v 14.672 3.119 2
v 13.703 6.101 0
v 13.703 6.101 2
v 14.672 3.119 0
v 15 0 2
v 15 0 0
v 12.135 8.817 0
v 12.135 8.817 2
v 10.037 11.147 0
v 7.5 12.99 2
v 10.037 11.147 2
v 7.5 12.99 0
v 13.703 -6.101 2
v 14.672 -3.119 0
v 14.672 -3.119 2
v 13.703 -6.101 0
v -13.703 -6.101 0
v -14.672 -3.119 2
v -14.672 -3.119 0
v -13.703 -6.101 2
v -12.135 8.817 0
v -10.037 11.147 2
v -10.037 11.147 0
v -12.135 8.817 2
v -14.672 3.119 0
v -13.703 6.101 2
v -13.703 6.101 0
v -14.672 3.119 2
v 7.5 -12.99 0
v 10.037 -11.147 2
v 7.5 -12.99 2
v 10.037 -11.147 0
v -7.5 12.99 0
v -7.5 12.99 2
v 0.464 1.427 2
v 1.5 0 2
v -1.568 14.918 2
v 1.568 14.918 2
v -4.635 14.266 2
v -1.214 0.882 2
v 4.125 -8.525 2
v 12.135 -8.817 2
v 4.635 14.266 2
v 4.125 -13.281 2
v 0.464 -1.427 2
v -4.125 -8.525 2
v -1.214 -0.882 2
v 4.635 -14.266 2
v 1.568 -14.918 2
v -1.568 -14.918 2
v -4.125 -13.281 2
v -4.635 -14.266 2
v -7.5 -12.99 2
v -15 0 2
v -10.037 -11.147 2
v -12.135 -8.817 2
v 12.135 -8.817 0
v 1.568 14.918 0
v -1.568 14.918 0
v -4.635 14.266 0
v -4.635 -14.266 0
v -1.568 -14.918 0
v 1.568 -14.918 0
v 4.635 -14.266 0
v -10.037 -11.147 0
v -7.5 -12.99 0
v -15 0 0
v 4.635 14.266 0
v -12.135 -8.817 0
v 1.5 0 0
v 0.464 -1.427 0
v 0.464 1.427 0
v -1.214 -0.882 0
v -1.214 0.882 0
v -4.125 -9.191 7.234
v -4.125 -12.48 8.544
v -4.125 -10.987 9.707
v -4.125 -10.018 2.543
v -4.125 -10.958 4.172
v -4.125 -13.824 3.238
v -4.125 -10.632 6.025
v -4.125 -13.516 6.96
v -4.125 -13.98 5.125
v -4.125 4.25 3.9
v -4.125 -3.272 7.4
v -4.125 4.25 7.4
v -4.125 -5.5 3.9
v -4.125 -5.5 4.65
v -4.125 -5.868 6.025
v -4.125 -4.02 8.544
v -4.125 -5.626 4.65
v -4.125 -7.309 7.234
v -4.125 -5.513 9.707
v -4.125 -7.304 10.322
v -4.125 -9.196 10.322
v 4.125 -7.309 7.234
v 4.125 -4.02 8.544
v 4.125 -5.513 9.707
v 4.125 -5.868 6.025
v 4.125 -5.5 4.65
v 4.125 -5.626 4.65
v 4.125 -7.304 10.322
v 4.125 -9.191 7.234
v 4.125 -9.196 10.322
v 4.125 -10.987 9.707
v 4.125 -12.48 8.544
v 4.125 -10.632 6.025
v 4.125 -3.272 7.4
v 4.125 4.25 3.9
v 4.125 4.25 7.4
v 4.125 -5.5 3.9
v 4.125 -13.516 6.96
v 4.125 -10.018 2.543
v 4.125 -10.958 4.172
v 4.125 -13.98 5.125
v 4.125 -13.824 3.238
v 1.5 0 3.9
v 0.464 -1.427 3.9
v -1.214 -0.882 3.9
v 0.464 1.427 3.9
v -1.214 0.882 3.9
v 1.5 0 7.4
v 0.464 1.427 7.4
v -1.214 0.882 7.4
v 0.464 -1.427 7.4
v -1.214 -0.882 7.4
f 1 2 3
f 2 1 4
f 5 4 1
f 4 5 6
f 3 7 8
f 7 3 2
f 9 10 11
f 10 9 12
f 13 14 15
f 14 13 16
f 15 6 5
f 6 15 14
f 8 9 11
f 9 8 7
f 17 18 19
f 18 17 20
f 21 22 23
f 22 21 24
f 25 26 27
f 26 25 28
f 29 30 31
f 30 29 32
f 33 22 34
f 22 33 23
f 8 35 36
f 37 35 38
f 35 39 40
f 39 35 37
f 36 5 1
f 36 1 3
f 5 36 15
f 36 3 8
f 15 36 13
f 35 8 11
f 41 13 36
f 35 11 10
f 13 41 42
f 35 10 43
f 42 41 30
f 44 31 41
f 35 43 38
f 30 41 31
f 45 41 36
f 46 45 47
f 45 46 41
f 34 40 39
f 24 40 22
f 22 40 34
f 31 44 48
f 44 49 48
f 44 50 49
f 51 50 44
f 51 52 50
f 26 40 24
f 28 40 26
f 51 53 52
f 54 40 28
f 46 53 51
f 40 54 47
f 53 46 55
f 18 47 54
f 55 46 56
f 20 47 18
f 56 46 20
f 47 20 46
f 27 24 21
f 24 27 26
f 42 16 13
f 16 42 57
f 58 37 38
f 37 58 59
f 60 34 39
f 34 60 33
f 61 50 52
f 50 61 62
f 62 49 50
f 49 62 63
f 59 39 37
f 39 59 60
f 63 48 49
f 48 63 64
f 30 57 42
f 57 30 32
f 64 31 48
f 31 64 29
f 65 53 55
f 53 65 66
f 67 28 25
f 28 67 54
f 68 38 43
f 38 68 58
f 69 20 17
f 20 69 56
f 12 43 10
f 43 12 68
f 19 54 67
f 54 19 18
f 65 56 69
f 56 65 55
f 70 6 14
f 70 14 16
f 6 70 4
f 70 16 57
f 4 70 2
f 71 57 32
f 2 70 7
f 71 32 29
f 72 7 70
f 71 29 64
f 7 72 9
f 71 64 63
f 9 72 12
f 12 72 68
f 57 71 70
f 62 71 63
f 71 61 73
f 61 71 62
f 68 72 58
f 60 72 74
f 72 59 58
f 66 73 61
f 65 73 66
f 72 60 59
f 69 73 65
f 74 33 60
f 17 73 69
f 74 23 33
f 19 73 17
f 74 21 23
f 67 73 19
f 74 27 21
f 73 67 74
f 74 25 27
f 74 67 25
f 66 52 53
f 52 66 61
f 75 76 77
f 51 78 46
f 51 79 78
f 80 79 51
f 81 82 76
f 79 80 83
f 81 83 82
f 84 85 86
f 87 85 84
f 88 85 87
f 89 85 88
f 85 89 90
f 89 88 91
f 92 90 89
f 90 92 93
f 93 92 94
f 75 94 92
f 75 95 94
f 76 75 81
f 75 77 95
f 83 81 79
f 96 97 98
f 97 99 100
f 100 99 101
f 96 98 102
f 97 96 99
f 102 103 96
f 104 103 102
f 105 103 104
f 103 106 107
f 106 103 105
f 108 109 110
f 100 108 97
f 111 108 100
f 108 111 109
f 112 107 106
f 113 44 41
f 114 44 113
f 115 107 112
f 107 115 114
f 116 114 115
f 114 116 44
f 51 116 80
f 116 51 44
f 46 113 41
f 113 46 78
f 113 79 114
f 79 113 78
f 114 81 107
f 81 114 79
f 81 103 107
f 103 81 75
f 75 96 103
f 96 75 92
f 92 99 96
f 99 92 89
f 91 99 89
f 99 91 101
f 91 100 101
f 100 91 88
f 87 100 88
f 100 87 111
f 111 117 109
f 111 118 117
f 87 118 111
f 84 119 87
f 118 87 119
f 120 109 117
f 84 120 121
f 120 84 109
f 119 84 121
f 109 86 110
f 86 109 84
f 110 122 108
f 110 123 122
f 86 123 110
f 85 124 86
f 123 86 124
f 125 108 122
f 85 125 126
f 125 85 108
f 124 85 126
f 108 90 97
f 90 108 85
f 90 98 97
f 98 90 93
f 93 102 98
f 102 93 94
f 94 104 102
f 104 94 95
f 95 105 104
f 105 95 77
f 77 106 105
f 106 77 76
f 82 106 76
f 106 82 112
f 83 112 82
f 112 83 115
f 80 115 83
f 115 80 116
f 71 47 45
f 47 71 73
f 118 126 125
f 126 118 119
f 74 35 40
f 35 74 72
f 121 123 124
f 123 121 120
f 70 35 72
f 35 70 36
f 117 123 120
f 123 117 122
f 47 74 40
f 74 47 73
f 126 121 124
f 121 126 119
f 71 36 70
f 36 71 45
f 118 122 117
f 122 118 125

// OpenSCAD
/*
    Join two rods, so that they can be turned to any angle, and held in place.
    
    Print Notes :
        Print with support (not only touching the build plate).
        
    Assembly :
        Print two copies, and sandwich them with a rubber washer.
        
        Cut away the support material (I knicked myself twice - be more careful than me!)
        Drill the holes out, so that the screw moves freely on one piece and bites in on the other.
        I used M3 bolts, so drilled one 2.5mm (and then tapped it), and then other 3.5mm (loose).
        If using bolts, rather than screws, then tap the hole.
        You can usually use the bolt itself to tap the hole, as the plastic is soft.
*/

rodD=5.5;

baseD=30;
thickness=2;
heft=3;
gap=2;
overlap=7;
screwD=3;

module clampShape()
{
    difference() {
        union() {
            circle( d=rodD + heft*2 );
            translate( [-rodD/2,rodD/2] ) square( [rodD,rodD/2+overlap] );
        }

        // Hole for the rod
        circle( d=rodD );
        // Flatten to ensure it doesn't stick through the base
        translate( [rodD/2+thickness/2,-rodD] ) square( [100,100] );
        // Cut away a corner, so the rod is free when the screw isn't tightened
        square( [rodD/2+heft,rodD/2] );
        // Cut a gap so that the screw squeezes the rod
        translate( [rodD/2-gap,0] ) square( [10,100] );
    }
}

module clamp()
{
    translate( [0,-rodD/2-heft-overlap/2+1,rodD/2] ) rotate( [0,90,0] ) {
        linear_extrude( rodD * 1.5, center=true, convexity=4 ) clampShape();
    }
}

module angleClamp()
{
    difference() {
        union() {
            // Circluar base
            cylinder(d=baseD, h=thickness);
            // Clamp
            translate([0,0,thickness-0.1]) clamp();
        }
        
        // Hole though 
        cylinder( d=screwD, h=100, center=true );
    }
}

// Uncomment to print 4 in one batch
//use <ntc/tools.scad>;
//ntc_arrange_circle( 4, 22 )

angleClamp();
